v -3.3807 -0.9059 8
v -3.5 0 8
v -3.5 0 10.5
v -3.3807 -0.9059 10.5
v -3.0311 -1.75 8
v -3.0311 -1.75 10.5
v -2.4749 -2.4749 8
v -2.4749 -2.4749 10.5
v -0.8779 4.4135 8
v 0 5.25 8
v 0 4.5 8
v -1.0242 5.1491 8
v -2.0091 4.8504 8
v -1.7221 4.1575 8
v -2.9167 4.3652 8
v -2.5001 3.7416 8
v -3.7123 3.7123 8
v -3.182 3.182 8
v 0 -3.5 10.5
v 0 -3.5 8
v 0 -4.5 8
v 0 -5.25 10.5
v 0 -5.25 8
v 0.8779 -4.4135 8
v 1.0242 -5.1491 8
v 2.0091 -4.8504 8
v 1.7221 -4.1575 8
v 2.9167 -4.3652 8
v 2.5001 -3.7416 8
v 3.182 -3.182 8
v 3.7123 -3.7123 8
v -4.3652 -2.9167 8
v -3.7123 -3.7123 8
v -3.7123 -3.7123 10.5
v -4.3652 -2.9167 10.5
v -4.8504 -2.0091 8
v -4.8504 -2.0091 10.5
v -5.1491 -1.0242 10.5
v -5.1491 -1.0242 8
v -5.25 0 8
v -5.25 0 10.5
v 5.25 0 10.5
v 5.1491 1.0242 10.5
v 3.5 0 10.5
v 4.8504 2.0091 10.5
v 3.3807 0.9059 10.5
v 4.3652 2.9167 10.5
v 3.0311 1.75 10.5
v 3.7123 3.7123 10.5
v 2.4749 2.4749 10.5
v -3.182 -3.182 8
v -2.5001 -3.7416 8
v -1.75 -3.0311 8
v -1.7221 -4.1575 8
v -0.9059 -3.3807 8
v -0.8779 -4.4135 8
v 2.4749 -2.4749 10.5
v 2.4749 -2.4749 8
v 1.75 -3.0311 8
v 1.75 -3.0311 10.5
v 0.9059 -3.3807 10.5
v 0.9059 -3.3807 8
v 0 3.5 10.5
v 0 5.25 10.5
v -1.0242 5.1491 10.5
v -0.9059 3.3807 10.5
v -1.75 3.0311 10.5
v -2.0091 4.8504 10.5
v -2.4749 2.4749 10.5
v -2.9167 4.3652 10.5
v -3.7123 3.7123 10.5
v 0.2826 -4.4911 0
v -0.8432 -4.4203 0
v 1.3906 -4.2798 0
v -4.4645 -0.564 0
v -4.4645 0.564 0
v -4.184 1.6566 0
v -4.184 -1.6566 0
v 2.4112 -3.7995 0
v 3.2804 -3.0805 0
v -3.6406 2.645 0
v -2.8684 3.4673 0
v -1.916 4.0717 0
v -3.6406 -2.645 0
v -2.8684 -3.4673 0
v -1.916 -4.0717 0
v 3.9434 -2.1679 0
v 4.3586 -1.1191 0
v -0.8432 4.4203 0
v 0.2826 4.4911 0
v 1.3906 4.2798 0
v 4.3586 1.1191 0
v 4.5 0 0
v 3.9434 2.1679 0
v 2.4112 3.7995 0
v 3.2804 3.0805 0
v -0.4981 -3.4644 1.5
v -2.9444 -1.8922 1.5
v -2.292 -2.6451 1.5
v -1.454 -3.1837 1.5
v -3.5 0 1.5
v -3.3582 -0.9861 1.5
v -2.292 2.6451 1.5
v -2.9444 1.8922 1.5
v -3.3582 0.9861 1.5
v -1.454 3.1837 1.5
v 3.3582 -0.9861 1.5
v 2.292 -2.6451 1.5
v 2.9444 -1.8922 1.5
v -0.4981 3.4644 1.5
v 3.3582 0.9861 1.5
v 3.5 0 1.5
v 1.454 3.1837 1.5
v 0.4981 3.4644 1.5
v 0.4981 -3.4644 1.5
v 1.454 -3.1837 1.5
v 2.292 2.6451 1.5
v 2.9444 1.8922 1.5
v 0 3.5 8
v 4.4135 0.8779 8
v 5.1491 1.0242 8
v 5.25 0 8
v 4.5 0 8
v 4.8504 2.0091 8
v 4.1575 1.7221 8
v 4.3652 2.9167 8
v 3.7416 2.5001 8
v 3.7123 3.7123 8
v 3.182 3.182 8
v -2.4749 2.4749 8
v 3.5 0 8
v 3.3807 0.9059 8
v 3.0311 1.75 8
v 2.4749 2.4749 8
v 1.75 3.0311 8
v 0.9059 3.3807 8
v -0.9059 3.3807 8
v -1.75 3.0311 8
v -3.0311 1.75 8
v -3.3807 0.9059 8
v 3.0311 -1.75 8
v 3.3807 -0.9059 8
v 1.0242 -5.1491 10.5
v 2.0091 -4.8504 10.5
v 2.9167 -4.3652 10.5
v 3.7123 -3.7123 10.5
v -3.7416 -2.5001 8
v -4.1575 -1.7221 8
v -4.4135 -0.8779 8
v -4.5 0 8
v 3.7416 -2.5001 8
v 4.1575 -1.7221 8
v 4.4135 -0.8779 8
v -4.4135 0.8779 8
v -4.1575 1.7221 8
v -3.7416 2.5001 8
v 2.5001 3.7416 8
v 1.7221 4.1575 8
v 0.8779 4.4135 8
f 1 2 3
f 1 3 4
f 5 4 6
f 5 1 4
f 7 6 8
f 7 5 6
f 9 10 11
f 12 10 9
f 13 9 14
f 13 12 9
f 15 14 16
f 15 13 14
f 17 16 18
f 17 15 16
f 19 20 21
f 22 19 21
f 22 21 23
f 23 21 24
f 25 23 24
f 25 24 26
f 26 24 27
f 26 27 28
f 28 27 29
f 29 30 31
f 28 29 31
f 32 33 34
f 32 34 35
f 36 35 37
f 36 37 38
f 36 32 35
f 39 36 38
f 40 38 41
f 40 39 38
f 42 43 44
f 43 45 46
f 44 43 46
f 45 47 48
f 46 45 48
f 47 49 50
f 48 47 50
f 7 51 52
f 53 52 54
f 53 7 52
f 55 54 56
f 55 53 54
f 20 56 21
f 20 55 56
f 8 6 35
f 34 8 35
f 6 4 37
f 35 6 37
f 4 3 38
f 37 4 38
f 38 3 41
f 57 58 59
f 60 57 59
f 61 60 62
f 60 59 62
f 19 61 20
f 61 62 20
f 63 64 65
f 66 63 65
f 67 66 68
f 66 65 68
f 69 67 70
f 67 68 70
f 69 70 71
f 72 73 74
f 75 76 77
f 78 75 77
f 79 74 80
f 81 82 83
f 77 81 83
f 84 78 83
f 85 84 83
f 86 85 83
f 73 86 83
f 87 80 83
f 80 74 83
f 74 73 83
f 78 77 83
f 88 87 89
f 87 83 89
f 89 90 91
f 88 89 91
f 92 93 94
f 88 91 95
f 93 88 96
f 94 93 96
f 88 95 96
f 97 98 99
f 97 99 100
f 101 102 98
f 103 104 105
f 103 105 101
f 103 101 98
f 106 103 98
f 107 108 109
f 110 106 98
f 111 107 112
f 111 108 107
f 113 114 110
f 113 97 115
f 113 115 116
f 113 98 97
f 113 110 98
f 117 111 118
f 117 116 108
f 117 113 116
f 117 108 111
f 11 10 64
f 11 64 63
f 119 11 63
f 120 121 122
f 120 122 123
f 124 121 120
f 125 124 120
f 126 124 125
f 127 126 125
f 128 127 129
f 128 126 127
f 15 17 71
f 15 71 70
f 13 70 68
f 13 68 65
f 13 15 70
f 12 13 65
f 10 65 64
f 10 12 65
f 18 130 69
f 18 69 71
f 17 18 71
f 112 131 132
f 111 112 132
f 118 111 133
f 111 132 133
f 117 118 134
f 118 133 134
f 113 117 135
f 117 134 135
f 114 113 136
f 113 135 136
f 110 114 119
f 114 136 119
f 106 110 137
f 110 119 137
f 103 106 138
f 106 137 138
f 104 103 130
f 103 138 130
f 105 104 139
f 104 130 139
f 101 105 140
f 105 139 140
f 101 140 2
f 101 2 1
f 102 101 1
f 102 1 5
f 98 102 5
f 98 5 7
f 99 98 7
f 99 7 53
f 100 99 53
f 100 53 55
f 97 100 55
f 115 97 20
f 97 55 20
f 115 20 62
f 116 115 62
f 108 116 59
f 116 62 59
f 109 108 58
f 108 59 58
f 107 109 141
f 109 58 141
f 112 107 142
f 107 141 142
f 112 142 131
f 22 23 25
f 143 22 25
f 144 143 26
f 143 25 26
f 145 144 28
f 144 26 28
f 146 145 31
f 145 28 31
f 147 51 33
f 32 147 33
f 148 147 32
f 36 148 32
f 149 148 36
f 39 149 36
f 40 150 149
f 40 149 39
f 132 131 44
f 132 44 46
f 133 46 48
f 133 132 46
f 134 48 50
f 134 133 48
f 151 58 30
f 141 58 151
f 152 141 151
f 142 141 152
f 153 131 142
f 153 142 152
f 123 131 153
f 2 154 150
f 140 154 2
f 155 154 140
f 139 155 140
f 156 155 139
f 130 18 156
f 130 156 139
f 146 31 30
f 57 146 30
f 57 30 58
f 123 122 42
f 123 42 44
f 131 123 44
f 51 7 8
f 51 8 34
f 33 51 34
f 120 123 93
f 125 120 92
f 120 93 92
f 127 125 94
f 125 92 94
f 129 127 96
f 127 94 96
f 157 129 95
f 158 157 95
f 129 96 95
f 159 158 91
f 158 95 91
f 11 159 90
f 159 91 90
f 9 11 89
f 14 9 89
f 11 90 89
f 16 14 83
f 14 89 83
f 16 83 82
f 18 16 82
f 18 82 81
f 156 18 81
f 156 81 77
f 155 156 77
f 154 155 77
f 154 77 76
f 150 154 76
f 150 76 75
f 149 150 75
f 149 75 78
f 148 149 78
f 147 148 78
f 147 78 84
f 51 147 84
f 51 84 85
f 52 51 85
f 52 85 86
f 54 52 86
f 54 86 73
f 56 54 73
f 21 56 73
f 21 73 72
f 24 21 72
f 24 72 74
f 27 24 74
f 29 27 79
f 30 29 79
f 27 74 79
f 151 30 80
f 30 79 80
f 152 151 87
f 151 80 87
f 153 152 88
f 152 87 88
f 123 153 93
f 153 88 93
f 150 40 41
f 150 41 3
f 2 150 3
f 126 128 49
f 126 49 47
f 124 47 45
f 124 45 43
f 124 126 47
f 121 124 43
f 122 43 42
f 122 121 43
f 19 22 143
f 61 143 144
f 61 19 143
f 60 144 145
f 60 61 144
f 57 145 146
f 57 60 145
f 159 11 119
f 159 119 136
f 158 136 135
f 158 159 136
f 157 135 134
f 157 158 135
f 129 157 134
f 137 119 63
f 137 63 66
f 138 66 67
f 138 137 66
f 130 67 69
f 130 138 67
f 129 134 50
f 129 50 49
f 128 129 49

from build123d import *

# Parameters (mm, degrees)
SKETCH1_R           = 4.5
BOSS_EXTRUDE1_DEPTH = 8
SKETCH2_R           = 3.5
CUT_EXTRUDE1_DEPTH  = 6.5
BOSS_EXTRUDE2_DEPTH = 2.5


with BuildPart() as part:
    # Sketch1 → Boss-Extrude1 (new body)
    with BuildSketch(Plane.XY):
        Circle(SKETCH1_R)
    extrude(amount=BOSS_EXTRUDE1_DEPTH)

    # Sketch2 → Cut-Extrude1 (cut)
    with BuildSketch(Plane.XY.offset(8)):
        Circle(SKETCH2_R)
    extrude(amount=-CUT_EXTRUDE1_DEPTH, mode=Mode.SUBTRACT)

    # Sketch3 → Boss-Extrude2 (add)
    with BuildSketch(Plane.XY.offset(8)):
        with BuildLine():
            Line((0, 5.25), (0, 3.5))
            ThreePointArc((0, 3.5), (-1.339392013, 3.233578364), (-2.474873734, 2.474873734))
            Line((-2.474873734, 2.474873734), (-3.712310601, 3.712310601))
            ThreePointArc((-3.712310601, 3.712310601), (-2.00908802, 4.850367546), (0, 5.25))
        make_face()
        with BuildLine():
            Line((-5.25, 0), (-3.5, 0))
            ThreePointArc((-3.5, 0), (-3.233578364, -1.339392013), (-2.474873734, -2.474873734))
            Line((-2.474873734, -2.474873734), (-3.712310601, -3.712310601))
            ThreePointArc((-3.712310601, -3.712310601), (-4.850367546, -2.00908802), (-5.25, 0))
        make_face()
        with BuildLine():
            Line((2.474873734, 2.474873734), (3.712310601, 3.712310601))
            ThreePointArc((3.712310601, 3.712310601), (4.850367546, 2.00908802), (5.25, 0))
            Line((5.25, 0), (3.5, 0))
            ThreePointArc((3.5, 0), (3.233578364, 1.339392013), (2.474873734, 2.474873734))
        make_face()
        with BuildLine():
            Line((0, -3.5), (0, -5.25))
            ThreePointArc((0, -5.25), (2.00908802, -4.850367546), (3.712310601, -3.712310601))
            Line((3.712310601, -3.712310601), (2.474873734, -2.474873734))
            ThreePointArc((2.474873734, -2.474873734), (1.339392013, -3.233578364), (0, -3.5))
        make_face()
    extrude(amount=BOSS_EXTRUDE2_DEPTH)


solid = part.part
